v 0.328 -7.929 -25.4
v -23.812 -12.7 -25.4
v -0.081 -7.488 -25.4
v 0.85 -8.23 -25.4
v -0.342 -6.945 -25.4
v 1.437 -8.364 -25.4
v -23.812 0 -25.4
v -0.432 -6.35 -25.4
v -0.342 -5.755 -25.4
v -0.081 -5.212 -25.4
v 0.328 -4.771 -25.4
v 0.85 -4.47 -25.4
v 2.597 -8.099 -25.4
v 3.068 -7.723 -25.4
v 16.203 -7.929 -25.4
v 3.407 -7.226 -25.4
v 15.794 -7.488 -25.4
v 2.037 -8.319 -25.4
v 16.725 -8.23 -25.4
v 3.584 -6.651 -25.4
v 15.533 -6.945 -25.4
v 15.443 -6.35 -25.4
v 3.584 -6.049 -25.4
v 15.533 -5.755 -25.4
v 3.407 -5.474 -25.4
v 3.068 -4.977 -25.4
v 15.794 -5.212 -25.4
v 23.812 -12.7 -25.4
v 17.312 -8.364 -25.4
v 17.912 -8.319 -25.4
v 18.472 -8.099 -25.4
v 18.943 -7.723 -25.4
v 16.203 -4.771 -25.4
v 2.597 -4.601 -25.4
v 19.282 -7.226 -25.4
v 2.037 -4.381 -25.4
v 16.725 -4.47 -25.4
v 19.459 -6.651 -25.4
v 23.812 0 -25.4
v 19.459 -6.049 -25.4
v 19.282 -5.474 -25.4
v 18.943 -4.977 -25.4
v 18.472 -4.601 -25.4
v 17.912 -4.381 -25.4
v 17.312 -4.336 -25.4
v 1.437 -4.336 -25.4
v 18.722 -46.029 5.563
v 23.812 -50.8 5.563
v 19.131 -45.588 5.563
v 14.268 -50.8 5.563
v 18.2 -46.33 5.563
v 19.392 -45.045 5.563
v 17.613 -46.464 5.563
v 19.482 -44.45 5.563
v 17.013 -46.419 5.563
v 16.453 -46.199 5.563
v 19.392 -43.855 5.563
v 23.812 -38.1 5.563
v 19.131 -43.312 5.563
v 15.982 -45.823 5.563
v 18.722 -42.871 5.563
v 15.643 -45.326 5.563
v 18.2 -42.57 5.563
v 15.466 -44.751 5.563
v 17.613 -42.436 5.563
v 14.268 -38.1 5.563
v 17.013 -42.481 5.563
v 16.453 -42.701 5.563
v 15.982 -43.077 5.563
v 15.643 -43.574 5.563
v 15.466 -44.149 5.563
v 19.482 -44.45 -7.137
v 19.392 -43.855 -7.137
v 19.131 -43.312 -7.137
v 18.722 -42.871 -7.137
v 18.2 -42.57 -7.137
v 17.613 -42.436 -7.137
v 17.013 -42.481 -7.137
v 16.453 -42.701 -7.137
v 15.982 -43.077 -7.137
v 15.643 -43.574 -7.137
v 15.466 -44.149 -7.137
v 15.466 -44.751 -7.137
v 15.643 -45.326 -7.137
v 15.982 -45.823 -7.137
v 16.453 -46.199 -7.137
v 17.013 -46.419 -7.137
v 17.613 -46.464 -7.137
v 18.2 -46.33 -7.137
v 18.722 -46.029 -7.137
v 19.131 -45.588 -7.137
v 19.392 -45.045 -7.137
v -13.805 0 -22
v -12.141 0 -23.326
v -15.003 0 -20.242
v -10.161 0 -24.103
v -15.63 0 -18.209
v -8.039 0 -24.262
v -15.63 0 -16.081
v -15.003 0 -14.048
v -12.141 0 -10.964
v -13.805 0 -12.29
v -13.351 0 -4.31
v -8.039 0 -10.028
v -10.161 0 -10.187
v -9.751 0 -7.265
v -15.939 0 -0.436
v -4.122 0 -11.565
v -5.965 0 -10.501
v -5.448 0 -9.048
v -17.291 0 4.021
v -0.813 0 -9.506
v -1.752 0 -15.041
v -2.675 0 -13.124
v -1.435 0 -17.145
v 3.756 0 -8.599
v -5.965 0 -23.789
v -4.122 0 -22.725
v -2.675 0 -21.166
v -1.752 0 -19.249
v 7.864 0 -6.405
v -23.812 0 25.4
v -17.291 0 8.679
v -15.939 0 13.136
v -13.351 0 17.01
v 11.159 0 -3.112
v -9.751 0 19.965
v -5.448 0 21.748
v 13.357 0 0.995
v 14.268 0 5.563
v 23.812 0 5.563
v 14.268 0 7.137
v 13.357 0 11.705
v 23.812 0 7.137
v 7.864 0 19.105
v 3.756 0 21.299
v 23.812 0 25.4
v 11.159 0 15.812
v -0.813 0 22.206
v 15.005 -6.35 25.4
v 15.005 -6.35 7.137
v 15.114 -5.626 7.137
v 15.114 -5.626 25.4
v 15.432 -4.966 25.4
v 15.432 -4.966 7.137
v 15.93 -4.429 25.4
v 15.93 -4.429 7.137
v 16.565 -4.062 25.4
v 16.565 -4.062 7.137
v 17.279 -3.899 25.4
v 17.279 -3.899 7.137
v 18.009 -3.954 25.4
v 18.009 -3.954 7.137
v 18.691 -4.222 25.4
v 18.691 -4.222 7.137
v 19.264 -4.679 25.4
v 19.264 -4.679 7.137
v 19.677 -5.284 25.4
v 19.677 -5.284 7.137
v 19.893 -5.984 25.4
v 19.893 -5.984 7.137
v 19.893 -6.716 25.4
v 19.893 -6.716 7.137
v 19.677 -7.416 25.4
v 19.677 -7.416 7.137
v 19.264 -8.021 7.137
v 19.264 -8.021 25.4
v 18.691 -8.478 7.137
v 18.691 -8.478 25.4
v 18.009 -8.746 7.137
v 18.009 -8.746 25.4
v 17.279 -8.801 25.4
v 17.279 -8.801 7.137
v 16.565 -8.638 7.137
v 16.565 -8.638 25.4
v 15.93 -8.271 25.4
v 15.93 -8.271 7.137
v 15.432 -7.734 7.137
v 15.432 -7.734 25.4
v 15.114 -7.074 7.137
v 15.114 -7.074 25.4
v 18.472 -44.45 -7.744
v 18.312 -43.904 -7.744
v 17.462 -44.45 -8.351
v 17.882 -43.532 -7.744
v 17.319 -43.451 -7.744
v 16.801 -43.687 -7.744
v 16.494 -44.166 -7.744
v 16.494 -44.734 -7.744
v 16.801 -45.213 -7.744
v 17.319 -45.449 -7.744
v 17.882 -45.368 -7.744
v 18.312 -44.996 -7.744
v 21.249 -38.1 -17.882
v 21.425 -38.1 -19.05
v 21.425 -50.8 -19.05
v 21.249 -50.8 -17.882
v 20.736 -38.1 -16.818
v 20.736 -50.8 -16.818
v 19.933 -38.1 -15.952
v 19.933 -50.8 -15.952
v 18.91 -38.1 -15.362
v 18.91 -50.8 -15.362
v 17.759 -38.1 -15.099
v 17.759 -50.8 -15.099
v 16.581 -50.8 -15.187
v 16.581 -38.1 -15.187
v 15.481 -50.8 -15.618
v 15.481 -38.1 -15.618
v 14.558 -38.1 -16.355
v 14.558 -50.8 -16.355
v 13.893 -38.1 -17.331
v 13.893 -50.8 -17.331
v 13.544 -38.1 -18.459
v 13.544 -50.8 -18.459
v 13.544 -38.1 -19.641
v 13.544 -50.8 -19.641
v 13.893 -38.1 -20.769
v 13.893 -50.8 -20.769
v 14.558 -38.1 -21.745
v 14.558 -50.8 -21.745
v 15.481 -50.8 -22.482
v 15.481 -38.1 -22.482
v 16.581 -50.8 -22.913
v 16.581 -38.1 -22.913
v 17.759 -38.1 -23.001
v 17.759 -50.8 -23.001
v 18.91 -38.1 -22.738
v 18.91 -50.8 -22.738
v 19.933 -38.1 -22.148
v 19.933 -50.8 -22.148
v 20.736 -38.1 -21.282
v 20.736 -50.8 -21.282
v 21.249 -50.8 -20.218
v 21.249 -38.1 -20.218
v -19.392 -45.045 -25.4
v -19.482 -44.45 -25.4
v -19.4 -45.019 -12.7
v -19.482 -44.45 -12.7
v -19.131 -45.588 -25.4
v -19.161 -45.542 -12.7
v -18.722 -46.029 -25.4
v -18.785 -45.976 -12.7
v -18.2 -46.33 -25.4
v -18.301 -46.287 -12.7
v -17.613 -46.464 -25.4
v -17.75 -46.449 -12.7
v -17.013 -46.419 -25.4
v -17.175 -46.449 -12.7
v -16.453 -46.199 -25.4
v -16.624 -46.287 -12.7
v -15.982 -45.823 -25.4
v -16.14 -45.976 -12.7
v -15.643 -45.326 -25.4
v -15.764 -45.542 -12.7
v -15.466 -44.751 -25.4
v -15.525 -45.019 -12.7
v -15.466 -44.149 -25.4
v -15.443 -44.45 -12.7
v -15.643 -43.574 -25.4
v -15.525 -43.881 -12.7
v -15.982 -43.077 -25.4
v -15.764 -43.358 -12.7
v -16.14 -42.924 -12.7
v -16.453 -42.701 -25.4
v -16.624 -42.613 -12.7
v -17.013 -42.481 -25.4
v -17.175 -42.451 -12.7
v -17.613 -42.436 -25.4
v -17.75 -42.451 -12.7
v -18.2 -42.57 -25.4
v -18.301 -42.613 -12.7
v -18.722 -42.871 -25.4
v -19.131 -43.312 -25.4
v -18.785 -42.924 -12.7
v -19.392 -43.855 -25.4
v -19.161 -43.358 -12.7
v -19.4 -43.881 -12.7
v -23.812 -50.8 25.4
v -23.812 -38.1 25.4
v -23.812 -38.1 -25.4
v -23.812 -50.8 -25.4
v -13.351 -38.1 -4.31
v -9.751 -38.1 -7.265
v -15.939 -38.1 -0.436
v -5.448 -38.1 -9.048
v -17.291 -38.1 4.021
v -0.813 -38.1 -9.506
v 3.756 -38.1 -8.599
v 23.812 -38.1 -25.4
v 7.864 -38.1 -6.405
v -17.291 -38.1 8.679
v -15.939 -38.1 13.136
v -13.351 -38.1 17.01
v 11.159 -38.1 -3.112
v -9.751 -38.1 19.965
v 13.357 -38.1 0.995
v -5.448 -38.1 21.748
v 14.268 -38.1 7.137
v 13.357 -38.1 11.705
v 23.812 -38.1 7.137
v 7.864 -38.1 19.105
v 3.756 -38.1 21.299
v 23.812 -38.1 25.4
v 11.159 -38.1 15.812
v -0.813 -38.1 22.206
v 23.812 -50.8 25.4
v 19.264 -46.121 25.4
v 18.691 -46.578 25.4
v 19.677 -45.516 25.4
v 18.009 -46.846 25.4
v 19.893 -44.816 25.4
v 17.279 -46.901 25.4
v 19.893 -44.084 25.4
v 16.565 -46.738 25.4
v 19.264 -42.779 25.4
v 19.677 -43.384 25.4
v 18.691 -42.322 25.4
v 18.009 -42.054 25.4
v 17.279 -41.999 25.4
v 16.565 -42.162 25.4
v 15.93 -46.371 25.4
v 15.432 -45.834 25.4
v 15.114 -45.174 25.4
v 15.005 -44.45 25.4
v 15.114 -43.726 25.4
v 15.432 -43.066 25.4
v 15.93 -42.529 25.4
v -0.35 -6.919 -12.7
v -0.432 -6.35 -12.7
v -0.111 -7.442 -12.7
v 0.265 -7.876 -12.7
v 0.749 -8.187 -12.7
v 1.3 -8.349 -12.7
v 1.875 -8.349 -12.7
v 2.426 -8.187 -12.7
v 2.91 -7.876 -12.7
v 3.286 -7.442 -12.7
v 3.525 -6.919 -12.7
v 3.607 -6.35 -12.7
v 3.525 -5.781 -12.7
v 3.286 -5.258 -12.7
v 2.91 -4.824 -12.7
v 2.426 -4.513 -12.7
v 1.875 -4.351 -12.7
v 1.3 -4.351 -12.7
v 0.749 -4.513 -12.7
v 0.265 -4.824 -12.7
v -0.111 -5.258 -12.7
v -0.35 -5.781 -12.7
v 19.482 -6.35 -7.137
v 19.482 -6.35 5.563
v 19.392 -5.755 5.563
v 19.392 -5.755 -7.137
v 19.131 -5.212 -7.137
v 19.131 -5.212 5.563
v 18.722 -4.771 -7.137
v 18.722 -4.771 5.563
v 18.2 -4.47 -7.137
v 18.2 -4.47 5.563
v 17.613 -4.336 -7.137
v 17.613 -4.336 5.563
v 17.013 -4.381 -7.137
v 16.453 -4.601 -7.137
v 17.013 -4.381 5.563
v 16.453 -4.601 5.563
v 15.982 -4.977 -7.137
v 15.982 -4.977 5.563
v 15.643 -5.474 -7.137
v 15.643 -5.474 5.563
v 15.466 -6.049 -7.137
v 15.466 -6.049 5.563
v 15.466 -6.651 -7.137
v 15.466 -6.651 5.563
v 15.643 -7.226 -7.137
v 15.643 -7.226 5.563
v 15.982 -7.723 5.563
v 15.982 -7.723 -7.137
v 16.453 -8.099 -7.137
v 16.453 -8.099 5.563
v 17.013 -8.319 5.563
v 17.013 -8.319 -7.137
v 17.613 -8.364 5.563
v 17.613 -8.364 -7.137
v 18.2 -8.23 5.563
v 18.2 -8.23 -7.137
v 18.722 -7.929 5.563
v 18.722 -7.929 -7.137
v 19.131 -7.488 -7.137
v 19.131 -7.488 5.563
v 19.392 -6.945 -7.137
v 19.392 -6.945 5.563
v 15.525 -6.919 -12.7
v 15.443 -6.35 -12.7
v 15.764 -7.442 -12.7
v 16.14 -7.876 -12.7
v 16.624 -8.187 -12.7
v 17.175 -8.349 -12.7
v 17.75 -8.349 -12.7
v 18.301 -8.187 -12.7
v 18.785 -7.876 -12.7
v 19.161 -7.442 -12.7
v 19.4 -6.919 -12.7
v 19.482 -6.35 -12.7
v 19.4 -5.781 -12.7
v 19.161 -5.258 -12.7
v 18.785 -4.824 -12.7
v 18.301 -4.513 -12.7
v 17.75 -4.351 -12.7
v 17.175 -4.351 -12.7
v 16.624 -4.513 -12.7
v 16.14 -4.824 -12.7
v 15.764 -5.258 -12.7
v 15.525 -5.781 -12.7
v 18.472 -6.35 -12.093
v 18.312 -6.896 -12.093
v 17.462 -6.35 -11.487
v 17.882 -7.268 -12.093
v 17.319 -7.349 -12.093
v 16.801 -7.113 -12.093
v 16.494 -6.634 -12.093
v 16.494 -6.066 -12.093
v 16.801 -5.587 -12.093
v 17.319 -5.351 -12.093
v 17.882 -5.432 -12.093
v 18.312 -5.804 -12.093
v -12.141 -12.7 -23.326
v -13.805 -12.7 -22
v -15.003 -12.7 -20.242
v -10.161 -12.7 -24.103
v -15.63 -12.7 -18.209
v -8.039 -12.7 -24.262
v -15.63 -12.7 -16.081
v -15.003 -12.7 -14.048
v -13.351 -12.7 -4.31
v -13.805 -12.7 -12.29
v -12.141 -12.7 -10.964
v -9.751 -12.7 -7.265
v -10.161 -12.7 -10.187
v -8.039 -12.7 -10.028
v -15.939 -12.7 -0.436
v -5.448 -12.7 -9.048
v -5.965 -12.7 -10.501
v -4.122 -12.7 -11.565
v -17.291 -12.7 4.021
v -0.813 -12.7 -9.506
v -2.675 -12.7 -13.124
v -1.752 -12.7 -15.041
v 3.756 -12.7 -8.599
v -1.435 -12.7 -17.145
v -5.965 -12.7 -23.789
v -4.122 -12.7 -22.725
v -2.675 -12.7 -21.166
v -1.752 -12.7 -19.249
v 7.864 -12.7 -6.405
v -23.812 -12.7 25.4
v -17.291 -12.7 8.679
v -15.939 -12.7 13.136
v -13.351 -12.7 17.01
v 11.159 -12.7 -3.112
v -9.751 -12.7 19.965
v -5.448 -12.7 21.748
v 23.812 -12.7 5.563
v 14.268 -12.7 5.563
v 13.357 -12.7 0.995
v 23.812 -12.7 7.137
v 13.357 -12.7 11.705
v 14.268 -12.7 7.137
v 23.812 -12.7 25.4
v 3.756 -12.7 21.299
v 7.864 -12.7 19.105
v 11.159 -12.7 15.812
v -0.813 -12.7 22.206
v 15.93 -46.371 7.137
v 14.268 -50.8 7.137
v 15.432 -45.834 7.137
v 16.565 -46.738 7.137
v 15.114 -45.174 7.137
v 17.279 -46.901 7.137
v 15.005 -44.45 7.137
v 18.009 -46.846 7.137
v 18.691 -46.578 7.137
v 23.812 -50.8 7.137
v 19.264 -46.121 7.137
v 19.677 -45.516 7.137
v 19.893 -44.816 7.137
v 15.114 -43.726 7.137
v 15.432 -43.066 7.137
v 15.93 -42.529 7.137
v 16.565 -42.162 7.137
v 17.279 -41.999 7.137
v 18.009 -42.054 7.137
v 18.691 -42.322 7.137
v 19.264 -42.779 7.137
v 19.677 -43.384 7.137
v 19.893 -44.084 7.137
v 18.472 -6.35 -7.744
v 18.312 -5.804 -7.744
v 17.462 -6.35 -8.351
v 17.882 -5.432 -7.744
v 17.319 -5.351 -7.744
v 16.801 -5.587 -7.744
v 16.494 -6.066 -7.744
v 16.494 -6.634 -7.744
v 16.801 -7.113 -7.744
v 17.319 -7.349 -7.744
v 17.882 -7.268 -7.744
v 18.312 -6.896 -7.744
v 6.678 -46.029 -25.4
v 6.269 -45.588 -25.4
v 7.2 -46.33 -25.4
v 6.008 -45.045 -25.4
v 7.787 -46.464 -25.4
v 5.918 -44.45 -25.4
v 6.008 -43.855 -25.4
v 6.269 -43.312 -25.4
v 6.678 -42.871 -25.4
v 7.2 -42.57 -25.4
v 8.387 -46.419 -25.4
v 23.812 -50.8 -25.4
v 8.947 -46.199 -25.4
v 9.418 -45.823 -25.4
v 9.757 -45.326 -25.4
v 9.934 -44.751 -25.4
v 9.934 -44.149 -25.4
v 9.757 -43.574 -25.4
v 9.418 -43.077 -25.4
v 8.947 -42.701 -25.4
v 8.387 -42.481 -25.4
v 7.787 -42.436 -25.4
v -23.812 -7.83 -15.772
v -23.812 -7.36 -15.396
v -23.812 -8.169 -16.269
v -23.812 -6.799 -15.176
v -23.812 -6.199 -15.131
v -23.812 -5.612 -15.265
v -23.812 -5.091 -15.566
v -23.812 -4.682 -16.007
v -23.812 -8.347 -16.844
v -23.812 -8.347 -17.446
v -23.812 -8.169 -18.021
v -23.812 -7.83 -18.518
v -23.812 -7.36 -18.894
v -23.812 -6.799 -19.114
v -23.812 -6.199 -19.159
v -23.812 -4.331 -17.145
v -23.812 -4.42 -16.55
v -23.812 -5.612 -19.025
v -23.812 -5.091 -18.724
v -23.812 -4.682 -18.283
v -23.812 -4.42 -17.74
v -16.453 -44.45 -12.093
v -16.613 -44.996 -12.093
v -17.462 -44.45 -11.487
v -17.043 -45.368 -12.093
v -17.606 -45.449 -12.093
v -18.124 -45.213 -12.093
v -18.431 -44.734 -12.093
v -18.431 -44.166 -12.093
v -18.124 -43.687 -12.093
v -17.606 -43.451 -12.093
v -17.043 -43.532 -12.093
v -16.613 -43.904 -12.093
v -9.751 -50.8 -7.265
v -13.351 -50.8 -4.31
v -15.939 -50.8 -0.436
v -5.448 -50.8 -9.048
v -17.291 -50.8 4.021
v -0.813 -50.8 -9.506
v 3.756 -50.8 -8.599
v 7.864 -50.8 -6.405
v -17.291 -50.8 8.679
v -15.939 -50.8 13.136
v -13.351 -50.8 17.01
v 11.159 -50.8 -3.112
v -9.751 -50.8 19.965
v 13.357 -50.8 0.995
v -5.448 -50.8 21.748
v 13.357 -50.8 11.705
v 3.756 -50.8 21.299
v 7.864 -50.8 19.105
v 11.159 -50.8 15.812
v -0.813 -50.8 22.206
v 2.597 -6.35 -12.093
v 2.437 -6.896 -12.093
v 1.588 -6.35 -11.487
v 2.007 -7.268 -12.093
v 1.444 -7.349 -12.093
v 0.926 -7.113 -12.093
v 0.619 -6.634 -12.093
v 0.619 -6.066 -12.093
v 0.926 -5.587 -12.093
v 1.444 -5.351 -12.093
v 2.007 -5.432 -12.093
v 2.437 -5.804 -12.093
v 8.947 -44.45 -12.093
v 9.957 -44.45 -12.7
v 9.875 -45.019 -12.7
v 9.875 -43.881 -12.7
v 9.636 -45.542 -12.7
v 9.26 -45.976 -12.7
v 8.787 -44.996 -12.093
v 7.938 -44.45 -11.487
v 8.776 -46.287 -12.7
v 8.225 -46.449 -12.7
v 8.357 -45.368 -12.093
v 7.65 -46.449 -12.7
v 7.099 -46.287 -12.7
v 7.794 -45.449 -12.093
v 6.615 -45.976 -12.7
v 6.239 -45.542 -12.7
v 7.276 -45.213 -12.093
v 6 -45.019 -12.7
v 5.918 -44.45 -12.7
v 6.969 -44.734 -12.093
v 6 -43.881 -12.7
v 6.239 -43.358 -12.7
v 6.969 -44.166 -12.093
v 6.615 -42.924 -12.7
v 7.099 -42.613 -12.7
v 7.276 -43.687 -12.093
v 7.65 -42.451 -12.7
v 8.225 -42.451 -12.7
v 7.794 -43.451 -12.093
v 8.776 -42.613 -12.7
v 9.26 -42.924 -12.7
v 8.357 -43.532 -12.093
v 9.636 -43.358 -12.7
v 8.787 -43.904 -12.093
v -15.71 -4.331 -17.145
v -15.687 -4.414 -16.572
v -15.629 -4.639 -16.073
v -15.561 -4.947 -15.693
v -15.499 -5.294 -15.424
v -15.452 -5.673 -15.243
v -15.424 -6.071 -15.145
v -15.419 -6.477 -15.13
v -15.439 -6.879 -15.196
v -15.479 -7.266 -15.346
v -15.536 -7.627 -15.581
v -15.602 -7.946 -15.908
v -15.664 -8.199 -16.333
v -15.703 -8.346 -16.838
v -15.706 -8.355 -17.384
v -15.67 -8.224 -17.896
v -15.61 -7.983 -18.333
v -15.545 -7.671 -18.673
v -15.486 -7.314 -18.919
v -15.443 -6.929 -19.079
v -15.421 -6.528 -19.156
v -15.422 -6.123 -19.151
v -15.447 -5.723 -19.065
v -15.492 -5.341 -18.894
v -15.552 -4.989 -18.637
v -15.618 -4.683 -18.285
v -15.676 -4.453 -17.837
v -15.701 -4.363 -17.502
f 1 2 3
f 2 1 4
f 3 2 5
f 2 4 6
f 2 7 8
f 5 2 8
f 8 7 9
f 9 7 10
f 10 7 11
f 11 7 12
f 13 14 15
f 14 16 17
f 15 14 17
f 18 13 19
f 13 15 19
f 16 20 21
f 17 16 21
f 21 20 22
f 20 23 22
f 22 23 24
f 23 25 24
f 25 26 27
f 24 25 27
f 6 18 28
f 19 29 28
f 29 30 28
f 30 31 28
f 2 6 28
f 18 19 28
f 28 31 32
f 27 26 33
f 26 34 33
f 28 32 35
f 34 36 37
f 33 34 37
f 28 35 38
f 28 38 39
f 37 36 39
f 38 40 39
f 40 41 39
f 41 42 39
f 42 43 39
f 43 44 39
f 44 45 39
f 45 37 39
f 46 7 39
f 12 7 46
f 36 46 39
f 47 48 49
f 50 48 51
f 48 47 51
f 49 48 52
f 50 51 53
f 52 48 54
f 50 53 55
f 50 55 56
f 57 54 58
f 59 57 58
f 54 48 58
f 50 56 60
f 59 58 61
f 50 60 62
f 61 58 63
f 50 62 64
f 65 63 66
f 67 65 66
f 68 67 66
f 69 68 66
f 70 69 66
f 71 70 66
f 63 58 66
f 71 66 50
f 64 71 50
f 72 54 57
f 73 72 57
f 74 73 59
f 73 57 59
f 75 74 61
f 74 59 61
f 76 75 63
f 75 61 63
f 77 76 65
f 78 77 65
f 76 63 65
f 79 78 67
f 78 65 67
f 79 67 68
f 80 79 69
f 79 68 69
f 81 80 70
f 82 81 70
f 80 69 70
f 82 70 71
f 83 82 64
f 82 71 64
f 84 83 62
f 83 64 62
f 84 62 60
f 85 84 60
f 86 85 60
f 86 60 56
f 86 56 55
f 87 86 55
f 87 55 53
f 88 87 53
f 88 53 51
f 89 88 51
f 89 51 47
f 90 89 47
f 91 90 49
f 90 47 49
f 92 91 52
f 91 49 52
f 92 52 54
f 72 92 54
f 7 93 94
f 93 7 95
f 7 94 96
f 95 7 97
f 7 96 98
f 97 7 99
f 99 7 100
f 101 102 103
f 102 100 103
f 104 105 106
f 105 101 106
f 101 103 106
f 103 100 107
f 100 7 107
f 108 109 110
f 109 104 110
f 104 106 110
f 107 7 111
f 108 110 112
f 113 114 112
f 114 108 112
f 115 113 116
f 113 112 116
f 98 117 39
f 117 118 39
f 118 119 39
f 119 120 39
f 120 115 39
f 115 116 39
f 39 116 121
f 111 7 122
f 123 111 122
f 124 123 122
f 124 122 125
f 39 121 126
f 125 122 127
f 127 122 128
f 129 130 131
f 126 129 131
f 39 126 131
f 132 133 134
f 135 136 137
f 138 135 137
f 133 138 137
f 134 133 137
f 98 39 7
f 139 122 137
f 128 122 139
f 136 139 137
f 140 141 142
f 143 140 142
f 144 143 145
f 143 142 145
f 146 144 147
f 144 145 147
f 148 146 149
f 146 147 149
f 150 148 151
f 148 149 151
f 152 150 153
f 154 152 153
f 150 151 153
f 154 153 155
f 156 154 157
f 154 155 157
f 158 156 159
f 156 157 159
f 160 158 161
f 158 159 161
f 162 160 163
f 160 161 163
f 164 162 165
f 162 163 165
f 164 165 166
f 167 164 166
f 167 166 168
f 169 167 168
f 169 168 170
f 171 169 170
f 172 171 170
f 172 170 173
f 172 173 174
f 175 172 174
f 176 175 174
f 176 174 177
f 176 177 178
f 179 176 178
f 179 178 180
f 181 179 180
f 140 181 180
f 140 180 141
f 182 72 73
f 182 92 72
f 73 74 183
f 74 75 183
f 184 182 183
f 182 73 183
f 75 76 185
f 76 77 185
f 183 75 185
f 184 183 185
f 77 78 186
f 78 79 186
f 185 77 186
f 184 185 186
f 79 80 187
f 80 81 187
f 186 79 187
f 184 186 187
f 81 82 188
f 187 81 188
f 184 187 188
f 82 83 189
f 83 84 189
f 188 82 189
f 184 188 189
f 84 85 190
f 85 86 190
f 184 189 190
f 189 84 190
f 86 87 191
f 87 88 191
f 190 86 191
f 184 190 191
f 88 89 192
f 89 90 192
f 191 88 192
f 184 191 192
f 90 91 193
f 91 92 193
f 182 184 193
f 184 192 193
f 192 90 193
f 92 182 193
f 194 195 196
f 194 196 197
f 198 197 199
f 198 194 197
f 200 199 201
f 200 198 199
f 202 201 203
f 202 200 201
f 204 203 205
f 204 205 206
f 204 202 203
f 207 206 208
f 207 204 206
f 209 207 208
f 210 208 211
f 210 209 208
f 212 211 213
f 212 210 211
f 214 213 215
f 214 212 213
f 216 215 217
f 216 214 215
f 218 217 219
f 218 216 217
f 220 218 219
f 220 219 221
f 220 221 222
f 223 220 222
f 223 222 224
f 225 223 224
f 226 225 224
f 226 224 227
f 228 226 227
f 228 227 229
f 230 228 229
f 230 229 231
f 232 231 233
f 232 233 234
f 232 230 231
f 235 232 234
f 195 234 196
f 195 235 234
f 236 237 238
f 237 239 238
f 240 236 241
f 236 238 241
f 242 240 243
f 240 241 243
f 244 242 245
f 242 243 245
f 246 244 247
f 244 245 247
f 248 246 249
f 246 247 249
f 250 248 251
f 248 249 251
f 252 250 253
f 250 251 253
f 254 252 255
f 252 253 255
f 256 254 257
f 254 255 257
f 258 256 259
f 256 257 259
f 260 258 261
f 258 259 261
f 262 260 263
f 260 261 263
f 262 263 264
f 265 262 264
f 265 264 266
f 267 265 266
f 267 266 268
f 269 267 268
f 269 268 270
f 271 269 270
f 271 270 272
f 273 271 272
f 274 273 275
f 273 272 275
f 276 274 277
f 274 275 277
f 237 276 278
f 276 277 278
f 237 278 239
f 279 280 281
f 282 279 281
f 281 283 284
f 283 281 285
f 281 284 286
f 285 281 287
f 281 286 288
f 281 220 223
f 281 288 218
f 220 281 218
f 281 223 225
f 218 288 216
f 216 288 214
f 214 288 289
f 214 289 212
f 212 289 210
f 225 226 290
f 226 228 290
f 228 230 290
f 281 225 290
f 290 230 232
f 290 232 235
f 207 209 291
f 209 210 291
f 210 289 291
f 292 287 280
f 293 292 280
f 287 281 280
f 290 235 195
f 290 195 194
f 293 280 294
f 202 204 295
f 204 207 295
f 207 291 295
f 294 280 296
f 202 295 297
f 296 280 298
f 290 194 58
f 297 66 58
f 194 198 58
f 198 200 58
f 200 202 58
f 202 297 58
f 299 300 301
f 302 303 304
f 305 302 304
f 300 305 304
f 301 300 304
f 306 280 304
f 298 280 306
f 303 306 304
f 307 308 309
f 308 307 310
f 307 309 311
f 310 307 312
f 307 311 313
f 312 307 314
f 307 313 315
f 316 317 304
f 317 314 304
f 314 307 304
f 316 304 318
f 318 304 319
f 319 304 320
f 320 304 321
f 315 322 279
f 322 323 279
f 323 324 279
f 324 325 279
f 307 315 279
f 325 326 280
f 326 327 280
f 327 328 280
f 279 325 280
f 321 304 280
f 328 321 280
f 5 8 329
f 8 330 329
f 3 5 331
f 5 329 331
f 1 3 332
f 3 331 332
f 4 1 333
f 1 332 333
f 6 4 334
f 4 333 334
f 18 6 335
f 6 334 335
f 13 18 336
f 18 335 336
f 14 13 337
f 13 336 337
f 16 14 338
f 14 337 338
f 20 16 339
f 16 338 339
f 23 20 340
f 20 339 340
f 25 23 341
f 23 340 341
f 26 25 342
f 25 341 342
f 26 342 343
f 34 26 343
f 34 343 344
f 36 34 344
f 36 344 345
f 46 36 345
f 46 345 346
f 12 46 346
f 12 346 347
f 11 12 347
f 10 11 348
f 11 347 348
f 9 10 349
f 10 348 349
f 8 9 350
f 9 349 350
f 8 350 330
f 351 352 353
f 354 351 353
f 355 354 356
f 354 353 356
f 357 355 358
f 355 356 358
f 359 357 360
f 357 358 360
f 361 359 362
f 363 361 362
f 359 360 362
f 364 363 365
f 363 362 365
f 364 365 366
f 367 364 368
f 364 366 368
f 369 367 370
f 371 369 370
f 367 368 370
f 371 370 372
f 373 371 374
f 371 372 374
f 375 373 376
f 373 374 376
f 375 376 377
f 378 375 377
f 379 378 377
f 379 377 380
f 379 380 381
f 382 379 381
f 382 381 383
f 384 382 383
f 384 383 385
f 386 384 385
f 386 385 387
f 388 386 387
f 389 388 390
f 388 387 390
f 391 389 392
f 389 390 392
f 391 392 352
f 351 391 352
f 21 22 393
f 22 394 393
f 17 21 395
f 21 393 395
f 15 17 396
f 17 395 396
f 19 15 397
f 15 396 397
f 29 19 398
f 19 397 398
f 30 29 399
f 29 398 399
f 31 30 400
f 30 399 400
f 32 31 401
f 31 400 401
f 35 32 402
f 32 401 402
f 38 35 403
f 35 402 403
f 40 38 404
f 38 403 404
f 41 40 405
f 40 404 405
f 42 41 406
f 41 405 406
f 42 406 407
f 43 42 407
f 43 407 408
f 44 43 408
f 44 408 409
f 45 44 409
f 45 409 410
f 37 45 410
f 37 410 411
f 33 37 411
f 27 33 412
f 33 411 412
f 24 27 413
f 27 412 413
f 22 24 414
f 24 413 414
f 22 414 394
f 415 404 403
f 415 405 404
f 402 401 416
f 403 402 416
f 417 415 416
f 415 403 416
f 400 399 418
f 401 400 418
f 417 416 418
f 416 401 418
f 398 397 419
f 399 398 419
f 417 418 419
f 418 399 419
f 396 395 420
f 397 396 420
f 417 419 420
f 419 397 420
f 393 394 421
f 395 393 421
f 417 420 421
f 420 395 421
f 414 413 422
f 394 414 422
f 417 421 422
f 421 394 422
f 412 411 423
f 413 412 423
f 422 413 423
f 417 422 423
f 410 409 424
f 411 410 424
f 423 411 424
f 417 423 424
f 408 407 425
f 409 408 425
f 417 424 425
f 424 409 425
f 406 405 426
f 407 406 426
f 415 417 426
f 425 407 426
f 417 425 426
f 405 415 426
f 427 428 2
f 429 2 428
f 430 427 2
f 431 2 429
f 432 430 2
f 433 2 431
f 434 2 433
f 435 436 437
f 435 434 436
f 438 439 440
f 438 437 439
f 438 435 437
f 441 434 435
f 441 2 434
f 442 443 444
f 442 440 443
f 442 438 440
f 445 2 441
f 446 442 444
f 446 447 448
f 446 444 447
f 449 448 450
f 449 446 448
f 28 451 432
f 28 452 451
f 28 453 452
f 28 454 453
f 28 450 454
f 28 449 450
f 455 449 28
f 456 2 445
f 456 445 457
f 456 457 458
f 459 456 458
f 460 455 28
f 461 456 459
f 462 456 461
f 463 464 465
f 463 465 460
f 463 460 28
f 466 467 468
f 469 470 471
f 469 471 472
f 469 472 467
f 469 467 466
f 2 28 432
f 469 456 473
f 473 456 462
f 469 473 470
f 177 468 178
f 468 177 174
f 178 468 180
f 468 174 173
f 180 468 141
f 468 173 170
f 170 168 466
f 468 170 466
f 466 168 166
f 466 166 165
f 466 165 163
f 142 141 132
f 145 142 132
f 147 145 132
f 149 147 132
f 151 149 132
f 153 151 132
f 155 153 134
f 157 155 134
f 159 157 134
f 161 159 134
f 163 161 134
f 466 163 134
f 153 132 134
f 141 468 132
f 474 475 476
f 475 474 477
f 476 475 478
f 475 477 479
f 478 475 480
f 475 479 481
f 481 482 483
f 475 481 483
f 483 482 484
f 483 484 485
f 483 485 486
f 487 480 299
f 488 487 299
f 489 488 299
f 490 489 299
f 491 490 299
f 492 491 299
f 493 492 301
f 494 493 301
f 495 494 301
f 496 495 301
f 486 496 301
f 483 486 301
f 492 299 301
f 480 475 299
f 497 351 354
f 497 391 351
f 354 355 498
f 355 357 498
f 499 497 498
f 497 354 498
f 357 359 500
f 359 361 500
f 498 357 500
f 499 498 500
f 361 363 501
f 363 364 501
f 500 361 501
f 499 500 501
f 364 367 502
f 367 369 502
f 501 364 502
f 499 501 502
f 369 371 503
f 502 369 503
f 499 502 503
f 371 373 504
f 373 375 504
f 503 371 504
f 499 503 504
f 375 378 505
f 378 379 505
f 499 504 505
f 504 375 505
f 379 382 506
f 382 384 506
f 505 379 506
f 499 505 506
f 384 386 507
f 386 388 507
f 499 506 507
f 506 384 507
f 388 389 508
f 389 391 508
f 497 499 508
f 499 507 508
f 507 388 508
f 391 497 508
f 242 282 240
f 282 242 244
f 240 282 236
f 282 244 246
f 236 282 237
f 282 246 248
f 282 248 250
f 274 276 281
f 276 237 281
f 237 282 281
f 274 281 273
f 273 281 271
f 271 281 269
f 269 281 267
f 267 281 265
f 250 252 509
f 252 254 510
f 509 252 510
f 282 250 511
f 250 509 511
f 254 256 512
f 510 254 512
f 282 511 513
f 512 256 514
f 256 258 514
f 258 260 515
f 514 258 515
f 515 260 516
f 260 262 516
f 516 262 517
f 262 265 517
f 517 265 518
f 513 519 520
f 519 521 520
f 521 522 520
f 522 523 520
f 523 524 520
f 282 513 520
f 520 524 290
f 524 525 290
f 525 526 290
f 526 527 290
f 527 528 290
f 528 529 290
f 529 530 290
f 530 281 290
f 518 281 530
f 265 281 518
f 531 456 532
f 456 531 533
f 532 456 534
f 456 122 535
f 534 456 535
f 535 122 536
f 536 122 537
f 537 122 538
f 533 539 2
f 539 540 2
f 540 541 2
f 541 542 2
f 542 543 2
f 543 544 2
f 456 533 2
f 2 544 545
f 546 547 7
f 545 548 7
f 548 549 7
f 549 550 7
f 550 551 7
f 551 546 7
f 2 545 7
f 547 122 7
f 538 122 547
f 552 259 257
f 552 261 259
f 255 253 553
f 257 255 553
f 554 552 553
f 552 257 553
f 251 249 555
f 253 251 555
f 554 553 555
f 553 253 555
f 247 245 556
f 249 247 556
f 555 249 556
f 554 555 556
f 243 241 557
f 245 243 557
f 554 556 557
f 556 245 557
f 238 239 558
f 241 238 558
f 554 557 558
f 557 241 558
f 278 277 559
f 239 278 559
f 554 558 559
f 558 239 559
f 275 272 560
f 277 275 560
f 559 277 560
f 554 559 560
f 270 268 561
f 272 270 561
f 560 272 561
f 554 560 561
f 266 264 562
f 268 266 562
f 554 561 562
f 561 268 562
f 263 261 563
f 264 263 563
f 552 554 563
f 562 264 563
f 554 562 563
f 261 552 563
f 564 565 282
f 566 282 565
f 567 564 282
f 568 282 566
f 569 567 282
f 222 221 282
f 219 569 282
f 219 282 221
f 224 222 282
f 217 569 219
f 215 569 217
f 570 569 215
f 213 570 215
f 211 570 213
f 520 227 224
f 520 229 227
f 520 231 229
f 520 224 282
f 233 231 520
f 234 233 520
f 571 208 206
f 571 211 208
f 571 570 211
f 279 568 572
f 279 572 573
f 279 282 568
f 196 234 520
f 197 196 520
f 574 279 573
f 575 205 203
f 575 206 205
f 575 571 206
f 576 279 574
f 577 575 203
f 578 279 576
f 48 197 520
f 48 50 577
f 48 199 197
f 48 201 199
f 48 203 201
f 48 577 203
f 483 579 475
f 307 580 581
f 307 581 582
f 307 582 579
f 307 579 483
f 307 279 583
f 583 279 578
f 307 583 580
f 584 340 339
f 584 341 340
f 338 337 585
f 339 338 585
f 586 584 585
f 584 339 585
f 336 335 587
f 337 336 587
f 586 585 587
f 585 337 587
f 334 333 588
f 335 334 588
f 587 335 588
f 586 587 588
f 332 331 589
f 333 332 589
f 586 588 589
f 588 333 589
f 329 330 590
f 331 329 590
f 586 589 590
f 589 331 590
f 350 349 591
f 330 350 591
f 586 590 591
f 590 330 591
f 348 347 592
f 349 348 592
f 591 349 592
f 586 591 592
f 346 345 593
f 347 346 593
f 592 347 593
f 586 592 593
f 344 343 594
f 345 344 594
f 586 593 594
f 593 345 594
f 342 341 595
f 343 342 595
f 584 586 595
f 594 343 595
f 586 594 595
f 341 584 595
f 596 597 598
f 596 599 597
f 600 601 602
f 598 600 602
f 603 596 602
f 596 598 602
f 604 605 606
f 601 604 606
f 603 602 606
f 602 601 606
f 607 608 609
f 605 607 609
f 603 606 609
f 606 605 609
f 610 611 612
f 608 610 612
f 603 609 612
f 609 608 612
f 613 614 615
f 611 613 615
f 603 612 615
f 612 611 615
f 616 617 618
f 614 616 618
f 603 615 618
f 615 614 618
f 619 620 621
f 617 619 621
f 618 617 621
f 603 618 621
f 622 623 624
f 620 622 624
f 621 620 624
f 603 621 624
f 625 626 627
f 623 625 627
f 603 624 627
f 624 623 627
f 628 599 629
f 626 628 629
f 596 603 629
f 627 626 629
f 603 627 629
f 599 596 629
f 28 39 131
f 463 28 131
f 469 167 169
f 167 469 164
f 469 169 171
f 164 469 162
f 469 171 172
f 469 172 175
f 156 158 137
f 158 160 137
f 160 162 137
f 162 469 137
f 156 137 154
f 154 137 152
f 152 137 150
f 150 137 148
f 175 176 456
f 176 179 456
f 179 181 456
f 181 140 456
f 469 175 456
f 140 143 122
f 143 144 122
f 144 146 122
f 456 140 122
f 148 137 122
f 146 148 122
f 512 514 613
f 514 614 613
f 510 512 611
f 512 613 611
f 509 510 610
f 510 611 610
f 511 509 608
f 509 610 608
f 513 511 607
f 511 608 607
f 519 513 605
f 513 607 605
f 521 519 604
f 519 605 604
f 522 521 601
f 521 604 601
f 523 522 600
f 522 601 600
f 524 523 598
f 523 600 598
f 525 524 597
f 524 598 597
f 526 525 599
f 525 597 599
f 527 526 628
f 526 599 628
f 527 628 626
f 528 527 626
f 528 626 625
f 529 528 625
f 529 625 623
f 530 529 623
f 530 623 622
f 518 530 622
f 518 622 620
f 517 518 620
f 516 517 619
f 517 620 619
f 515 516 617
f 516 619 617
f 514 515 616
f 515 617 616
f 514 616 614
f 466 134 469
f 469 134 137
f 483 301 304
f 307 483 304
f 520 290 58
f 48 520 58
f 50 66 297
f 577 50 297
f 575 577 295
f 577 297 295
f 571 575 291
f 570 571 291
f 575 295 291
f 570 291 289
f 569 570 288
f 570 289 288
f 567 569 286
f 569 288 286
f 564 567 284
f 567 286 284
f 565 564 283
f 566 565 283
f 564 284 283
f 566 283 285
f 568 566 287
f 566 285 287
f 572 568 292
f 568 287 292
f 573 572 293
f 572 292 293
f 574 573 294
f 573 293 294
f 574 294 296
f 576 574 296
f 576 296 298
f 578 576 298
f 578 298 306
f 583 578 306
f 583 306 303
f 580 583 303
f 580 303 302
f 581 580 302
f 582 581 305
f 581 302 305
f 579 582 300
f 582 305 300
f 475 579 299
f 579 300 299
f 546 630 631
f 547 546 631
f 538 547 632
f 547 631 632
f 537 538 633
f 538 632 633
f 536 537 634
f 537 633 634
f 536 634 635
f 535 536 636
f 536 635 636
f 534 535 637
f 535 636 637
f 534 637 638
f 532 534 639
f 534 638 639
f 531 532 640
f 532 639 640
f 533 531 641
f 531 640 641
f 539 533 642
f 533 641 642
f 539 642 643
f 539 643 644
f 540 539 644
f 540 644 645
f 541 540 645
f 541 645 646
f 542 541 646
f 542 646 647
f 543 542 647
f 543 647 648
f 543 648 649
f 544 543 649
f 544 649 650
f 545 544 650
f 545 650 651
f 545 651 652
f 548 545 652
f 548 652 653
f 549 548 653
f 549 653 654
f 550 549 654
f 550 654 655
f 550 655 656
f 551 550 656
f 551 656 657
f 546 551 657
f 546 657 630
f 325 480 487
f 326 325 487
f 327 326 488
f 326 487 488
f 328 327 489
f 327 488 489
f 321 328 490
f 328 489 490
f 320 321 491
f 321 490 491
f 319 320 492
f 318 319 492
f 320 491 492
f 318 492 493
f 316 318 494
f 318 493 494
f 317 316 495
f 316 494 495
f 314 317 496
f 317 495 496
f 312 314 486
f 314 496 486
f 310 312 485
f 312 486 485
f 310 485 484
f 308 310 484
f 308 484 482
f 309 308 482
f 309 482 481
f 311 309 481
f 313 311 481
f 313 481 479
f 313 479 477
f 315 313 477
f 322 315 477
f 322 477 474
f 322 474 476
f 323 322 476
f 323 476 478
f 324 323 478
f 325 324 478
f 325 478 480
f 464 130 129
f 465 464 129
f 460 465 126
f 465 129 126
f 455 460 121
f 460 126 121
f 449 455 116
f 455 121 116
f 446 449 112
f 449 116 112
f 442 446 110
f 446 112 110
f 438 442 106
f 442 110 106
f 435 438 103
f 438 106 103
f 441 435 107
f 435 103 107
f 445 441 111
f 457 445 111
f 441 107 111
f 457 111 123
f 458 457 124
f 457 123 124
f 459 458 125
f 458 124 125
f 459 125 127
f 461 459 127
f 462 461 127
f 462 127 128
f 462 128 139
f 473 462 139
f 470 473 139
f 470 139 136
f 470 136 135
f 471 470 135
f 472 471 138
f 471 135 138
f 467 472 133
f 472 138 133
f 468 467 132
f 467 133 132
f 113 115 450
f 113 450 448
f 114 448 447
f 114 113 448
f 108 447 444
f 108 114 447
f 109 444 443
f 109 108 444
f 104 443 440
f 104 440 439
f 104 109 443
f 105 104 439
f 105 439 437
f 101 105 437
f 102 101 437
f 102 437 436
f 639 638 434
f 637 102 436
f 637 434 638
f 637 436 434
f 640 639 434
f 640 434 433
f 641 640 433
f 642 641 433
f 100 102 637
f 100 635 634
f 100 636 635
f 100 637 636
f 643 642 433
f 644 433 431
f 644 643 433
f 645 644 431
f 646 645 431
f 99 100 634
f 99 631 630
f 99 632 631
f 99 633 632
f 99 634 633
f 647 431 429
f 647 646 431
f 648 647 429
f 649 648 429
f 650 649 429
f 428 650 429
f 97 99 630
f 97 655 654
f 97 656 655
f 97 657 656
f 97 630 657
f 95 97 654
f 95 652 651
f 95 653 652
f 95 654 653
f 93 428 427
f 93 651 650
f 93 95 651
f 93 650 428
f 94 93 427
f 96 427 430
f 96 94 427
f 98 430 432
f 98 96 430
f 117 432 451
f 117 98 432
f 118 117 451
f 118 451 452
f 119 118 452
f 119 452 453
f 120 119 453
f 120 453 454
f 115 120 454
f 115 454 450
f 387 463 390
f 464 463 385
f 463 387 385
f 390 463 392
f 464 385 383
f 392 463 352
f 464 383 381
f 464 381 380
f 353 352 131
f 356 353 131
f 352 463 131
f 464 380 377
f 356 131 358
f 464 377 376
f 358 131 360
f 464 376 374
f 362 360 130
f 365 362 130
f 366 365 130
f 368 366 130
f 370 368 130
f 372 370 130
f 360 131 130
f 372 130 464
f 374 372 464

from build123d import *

# Parameters (mm, degrees)
F0_R      = 7.1374
F1_DEPTH  = 12.7
F3_D      = 4.0386
F3_DEPTH  = 9.525
F3_TIP    = 1.213317848
F5_D      = 4.0386
F5_DEPTH  = 12.7
F5_TIP    = 1.213317848
F7_D      = 4.0386
F7_DEPTH  = 12.7
F7_TIP    = 1.213317848
F9_D      = 4.9149
F9_DEPTH  = 18.288
F9_TIP    = 1.4765849282
F11_R     = 3.9624
F12_DEPTH = 12.7
F14_D     = 4.0386
F14_DEPTH = 12.7
F14_TIP   = 1.213317848
F16_D     = 4.9149
F16_DEPTH = 18.288
F16_TIP   = 1.4765849282
F18_D     = 4.0386
F18_DEPTH = 12.7
F18_TIP   = 1.213317848


with BuildPart() as f1:
    # F0 (on Front) → F1 (new body)
    with BuildSketch(Plane.XZ):
        with BuildLine():
            Line((-23.8125, -25.4), (23.8125, -25.4))
            Line((23.8125, -25.4), (23.8125, 5.5626))
            Line((23.8125, 5.5626), (14.267960455, 5.5626))
            ThreePointArc((14.267960455, 5.5626), (-17.4625, 6.35), (14.267960455, 7.1374))
            Line((14.267960455, 7.1374), (23.8125, 7.1374))
            Line((23.8125, 7.1374), (23.8125, 25.4))
            Line((23.8125, 25.4), (-23.8125, 25.4))
            Line((-23.8125, 25.4), (-23.8125, -25.4))
        make_face()
        with Locations((-8.5725, -17.145)):
            Circle(F0_R, mode=Mode.SUBTRACT)
    extrude(amount=F1_DEPTH)

    # F3
    with Locations(Plane(origin=(-23.8125, 0, 0), x_dir=(0, -1, 0), z_dir=(-1, 0, 0))):
        with Locations((6.35, -17.145)):
            Hole(F3_D / 2, depth=F3_DEPTH)
            with Locations((0, 0, -(F3_DEPTH + F3_TIP / 2))):  # 118° drill point
                Cone(0, F3_D / 2, F3_TIP, mode=Mode.SUBTRACT)

    # F5
    with Locations(Plane(origin=(0, 0, -25.4), x_dir=(1, 0, 0), z_dir=(0, 0, -1))):
        with Locations((1.5875, 6.35), (17.4625, 6.35)):
            Hole(F5_D / 2, depth=F5_DEPTH)
            with Locations((0, 0, -(F5_DEPTH + F5_TIP / 2))):  # 118° drill point
                Cone(0, F5_D / 2, F5_TIP, mode=Mode.SUBTRACT)

    # F7 (one way)
    with BuildSketch(Plane.XY.offset(5.5626)):
        with Locations((17.4625, -6.35)):
            Circle(F7_D / 2)
    extrude(amount=-F7_DEPTH, mode=Mode.SUBTRACT)
    with Locations(Plane.XY.offset(5.5626)):
        with Locations((17.4625, -6.35)):
            with Locations((0, 0, -(F7_DEPTH + F7_TIP / 2))):  # 118° drill point
                Cone(0, F7_D / 2, F7_TIP, mode=Mode.SUBTRACT)

    # F9
    with Locations(Plane.XY.offset(25.4)):
        with Locations((17.4625, -6.35)):
            Hole(F9_D / 2, depth=F9_DEPTH)
            with Locations((0, 0, -(F9_DEPTH + F9_TIP / 2))):  # 118° drill point
                Cone(0, F9_D / 2, F9_TIP, mode=Mode.SUBTRACT)


with BuildPart() as f12:
    # F11 (on offset) → F12 (new body)
    with BuildSketch(Plane.XZ.offset(38.1)):
        with BuildLine():
            Line((-23.8125, 25.4), (-23.8125, -25.4))
            Line((-23.8125, -25.4), (23.8125, -25.4))
            Line((23.8125, -25.4), (23.8125, 5.5626))
            Line((23.8125, 5.5626), (14.267960455, 5.5626))
            ThreePointArc((14.267960455, 5.5626), (-17.4625, 6.35), (14.267960455, 7.1374))
            Line((14.267960455, 7.1374), (23.8125, 7.1374))
            Line((23.8125, 7.1374), (23.8125, 25.4))
            Line((23.8125, 25.4), (-23.8125, 25.4))
        make_face()
        with Locations((17.4625, -19.05)):
            Circle(F11_R, mode=Mode.SUBTRACT)
    extrude(amount=F12_DEPTH)

    # F14 (one way)
    with BuildSketch(Plane.XY.offset(5.5626)):
        with Locations((17.4625, -44.45)):
            Circle(F14_D / 2)
    extrude(amount=-F14_DEPTH, mode=Mode.SUBTRACT)
    with Locations(Plane.XY.offset(5.5626)):
        with Locations((17.4625, -44.45)):
            with Locations((0, 0, -(F14_DEPTH + F14_TIP / 2))):  # 118° drill point
                Cone(0, F14_D / 2, F14_TIP, mode=Mode.SUBTRACT)

    # F16
    with Locations(Plane.XY.offset(25.4)):
        with Locations((17.4625, -44.45)):
            Hole(F16_D / 2, depth=F16_DEPTH)
            with Locations((0, 0, -(F16_DEPTH + F16_TIP / 2))):  # 118° drill point
                Cone(0, F16_D / 2, F16_TIP, mode=Mode.SUBTRACT)

    # F18
    with Locations(Plane(origin=(0, 0, -25.4), x_dir=(1, 0, 0), z_dir=(0, 0, -1))):
        with Locations((-17.4625, 44.45), (7.9375, 44.45)):
            Hole(F18_D / 2, depth=F18_DEPTH)
            with Locations((0, 0, -(F18_DEPTH + F18_TIP / 2))):  # 118° drill point
                Cone(0, F18_D / 2, F18_TIP, mode=Mode.SUBTRACT)


solid = Compound([f1.part, f12.part])
